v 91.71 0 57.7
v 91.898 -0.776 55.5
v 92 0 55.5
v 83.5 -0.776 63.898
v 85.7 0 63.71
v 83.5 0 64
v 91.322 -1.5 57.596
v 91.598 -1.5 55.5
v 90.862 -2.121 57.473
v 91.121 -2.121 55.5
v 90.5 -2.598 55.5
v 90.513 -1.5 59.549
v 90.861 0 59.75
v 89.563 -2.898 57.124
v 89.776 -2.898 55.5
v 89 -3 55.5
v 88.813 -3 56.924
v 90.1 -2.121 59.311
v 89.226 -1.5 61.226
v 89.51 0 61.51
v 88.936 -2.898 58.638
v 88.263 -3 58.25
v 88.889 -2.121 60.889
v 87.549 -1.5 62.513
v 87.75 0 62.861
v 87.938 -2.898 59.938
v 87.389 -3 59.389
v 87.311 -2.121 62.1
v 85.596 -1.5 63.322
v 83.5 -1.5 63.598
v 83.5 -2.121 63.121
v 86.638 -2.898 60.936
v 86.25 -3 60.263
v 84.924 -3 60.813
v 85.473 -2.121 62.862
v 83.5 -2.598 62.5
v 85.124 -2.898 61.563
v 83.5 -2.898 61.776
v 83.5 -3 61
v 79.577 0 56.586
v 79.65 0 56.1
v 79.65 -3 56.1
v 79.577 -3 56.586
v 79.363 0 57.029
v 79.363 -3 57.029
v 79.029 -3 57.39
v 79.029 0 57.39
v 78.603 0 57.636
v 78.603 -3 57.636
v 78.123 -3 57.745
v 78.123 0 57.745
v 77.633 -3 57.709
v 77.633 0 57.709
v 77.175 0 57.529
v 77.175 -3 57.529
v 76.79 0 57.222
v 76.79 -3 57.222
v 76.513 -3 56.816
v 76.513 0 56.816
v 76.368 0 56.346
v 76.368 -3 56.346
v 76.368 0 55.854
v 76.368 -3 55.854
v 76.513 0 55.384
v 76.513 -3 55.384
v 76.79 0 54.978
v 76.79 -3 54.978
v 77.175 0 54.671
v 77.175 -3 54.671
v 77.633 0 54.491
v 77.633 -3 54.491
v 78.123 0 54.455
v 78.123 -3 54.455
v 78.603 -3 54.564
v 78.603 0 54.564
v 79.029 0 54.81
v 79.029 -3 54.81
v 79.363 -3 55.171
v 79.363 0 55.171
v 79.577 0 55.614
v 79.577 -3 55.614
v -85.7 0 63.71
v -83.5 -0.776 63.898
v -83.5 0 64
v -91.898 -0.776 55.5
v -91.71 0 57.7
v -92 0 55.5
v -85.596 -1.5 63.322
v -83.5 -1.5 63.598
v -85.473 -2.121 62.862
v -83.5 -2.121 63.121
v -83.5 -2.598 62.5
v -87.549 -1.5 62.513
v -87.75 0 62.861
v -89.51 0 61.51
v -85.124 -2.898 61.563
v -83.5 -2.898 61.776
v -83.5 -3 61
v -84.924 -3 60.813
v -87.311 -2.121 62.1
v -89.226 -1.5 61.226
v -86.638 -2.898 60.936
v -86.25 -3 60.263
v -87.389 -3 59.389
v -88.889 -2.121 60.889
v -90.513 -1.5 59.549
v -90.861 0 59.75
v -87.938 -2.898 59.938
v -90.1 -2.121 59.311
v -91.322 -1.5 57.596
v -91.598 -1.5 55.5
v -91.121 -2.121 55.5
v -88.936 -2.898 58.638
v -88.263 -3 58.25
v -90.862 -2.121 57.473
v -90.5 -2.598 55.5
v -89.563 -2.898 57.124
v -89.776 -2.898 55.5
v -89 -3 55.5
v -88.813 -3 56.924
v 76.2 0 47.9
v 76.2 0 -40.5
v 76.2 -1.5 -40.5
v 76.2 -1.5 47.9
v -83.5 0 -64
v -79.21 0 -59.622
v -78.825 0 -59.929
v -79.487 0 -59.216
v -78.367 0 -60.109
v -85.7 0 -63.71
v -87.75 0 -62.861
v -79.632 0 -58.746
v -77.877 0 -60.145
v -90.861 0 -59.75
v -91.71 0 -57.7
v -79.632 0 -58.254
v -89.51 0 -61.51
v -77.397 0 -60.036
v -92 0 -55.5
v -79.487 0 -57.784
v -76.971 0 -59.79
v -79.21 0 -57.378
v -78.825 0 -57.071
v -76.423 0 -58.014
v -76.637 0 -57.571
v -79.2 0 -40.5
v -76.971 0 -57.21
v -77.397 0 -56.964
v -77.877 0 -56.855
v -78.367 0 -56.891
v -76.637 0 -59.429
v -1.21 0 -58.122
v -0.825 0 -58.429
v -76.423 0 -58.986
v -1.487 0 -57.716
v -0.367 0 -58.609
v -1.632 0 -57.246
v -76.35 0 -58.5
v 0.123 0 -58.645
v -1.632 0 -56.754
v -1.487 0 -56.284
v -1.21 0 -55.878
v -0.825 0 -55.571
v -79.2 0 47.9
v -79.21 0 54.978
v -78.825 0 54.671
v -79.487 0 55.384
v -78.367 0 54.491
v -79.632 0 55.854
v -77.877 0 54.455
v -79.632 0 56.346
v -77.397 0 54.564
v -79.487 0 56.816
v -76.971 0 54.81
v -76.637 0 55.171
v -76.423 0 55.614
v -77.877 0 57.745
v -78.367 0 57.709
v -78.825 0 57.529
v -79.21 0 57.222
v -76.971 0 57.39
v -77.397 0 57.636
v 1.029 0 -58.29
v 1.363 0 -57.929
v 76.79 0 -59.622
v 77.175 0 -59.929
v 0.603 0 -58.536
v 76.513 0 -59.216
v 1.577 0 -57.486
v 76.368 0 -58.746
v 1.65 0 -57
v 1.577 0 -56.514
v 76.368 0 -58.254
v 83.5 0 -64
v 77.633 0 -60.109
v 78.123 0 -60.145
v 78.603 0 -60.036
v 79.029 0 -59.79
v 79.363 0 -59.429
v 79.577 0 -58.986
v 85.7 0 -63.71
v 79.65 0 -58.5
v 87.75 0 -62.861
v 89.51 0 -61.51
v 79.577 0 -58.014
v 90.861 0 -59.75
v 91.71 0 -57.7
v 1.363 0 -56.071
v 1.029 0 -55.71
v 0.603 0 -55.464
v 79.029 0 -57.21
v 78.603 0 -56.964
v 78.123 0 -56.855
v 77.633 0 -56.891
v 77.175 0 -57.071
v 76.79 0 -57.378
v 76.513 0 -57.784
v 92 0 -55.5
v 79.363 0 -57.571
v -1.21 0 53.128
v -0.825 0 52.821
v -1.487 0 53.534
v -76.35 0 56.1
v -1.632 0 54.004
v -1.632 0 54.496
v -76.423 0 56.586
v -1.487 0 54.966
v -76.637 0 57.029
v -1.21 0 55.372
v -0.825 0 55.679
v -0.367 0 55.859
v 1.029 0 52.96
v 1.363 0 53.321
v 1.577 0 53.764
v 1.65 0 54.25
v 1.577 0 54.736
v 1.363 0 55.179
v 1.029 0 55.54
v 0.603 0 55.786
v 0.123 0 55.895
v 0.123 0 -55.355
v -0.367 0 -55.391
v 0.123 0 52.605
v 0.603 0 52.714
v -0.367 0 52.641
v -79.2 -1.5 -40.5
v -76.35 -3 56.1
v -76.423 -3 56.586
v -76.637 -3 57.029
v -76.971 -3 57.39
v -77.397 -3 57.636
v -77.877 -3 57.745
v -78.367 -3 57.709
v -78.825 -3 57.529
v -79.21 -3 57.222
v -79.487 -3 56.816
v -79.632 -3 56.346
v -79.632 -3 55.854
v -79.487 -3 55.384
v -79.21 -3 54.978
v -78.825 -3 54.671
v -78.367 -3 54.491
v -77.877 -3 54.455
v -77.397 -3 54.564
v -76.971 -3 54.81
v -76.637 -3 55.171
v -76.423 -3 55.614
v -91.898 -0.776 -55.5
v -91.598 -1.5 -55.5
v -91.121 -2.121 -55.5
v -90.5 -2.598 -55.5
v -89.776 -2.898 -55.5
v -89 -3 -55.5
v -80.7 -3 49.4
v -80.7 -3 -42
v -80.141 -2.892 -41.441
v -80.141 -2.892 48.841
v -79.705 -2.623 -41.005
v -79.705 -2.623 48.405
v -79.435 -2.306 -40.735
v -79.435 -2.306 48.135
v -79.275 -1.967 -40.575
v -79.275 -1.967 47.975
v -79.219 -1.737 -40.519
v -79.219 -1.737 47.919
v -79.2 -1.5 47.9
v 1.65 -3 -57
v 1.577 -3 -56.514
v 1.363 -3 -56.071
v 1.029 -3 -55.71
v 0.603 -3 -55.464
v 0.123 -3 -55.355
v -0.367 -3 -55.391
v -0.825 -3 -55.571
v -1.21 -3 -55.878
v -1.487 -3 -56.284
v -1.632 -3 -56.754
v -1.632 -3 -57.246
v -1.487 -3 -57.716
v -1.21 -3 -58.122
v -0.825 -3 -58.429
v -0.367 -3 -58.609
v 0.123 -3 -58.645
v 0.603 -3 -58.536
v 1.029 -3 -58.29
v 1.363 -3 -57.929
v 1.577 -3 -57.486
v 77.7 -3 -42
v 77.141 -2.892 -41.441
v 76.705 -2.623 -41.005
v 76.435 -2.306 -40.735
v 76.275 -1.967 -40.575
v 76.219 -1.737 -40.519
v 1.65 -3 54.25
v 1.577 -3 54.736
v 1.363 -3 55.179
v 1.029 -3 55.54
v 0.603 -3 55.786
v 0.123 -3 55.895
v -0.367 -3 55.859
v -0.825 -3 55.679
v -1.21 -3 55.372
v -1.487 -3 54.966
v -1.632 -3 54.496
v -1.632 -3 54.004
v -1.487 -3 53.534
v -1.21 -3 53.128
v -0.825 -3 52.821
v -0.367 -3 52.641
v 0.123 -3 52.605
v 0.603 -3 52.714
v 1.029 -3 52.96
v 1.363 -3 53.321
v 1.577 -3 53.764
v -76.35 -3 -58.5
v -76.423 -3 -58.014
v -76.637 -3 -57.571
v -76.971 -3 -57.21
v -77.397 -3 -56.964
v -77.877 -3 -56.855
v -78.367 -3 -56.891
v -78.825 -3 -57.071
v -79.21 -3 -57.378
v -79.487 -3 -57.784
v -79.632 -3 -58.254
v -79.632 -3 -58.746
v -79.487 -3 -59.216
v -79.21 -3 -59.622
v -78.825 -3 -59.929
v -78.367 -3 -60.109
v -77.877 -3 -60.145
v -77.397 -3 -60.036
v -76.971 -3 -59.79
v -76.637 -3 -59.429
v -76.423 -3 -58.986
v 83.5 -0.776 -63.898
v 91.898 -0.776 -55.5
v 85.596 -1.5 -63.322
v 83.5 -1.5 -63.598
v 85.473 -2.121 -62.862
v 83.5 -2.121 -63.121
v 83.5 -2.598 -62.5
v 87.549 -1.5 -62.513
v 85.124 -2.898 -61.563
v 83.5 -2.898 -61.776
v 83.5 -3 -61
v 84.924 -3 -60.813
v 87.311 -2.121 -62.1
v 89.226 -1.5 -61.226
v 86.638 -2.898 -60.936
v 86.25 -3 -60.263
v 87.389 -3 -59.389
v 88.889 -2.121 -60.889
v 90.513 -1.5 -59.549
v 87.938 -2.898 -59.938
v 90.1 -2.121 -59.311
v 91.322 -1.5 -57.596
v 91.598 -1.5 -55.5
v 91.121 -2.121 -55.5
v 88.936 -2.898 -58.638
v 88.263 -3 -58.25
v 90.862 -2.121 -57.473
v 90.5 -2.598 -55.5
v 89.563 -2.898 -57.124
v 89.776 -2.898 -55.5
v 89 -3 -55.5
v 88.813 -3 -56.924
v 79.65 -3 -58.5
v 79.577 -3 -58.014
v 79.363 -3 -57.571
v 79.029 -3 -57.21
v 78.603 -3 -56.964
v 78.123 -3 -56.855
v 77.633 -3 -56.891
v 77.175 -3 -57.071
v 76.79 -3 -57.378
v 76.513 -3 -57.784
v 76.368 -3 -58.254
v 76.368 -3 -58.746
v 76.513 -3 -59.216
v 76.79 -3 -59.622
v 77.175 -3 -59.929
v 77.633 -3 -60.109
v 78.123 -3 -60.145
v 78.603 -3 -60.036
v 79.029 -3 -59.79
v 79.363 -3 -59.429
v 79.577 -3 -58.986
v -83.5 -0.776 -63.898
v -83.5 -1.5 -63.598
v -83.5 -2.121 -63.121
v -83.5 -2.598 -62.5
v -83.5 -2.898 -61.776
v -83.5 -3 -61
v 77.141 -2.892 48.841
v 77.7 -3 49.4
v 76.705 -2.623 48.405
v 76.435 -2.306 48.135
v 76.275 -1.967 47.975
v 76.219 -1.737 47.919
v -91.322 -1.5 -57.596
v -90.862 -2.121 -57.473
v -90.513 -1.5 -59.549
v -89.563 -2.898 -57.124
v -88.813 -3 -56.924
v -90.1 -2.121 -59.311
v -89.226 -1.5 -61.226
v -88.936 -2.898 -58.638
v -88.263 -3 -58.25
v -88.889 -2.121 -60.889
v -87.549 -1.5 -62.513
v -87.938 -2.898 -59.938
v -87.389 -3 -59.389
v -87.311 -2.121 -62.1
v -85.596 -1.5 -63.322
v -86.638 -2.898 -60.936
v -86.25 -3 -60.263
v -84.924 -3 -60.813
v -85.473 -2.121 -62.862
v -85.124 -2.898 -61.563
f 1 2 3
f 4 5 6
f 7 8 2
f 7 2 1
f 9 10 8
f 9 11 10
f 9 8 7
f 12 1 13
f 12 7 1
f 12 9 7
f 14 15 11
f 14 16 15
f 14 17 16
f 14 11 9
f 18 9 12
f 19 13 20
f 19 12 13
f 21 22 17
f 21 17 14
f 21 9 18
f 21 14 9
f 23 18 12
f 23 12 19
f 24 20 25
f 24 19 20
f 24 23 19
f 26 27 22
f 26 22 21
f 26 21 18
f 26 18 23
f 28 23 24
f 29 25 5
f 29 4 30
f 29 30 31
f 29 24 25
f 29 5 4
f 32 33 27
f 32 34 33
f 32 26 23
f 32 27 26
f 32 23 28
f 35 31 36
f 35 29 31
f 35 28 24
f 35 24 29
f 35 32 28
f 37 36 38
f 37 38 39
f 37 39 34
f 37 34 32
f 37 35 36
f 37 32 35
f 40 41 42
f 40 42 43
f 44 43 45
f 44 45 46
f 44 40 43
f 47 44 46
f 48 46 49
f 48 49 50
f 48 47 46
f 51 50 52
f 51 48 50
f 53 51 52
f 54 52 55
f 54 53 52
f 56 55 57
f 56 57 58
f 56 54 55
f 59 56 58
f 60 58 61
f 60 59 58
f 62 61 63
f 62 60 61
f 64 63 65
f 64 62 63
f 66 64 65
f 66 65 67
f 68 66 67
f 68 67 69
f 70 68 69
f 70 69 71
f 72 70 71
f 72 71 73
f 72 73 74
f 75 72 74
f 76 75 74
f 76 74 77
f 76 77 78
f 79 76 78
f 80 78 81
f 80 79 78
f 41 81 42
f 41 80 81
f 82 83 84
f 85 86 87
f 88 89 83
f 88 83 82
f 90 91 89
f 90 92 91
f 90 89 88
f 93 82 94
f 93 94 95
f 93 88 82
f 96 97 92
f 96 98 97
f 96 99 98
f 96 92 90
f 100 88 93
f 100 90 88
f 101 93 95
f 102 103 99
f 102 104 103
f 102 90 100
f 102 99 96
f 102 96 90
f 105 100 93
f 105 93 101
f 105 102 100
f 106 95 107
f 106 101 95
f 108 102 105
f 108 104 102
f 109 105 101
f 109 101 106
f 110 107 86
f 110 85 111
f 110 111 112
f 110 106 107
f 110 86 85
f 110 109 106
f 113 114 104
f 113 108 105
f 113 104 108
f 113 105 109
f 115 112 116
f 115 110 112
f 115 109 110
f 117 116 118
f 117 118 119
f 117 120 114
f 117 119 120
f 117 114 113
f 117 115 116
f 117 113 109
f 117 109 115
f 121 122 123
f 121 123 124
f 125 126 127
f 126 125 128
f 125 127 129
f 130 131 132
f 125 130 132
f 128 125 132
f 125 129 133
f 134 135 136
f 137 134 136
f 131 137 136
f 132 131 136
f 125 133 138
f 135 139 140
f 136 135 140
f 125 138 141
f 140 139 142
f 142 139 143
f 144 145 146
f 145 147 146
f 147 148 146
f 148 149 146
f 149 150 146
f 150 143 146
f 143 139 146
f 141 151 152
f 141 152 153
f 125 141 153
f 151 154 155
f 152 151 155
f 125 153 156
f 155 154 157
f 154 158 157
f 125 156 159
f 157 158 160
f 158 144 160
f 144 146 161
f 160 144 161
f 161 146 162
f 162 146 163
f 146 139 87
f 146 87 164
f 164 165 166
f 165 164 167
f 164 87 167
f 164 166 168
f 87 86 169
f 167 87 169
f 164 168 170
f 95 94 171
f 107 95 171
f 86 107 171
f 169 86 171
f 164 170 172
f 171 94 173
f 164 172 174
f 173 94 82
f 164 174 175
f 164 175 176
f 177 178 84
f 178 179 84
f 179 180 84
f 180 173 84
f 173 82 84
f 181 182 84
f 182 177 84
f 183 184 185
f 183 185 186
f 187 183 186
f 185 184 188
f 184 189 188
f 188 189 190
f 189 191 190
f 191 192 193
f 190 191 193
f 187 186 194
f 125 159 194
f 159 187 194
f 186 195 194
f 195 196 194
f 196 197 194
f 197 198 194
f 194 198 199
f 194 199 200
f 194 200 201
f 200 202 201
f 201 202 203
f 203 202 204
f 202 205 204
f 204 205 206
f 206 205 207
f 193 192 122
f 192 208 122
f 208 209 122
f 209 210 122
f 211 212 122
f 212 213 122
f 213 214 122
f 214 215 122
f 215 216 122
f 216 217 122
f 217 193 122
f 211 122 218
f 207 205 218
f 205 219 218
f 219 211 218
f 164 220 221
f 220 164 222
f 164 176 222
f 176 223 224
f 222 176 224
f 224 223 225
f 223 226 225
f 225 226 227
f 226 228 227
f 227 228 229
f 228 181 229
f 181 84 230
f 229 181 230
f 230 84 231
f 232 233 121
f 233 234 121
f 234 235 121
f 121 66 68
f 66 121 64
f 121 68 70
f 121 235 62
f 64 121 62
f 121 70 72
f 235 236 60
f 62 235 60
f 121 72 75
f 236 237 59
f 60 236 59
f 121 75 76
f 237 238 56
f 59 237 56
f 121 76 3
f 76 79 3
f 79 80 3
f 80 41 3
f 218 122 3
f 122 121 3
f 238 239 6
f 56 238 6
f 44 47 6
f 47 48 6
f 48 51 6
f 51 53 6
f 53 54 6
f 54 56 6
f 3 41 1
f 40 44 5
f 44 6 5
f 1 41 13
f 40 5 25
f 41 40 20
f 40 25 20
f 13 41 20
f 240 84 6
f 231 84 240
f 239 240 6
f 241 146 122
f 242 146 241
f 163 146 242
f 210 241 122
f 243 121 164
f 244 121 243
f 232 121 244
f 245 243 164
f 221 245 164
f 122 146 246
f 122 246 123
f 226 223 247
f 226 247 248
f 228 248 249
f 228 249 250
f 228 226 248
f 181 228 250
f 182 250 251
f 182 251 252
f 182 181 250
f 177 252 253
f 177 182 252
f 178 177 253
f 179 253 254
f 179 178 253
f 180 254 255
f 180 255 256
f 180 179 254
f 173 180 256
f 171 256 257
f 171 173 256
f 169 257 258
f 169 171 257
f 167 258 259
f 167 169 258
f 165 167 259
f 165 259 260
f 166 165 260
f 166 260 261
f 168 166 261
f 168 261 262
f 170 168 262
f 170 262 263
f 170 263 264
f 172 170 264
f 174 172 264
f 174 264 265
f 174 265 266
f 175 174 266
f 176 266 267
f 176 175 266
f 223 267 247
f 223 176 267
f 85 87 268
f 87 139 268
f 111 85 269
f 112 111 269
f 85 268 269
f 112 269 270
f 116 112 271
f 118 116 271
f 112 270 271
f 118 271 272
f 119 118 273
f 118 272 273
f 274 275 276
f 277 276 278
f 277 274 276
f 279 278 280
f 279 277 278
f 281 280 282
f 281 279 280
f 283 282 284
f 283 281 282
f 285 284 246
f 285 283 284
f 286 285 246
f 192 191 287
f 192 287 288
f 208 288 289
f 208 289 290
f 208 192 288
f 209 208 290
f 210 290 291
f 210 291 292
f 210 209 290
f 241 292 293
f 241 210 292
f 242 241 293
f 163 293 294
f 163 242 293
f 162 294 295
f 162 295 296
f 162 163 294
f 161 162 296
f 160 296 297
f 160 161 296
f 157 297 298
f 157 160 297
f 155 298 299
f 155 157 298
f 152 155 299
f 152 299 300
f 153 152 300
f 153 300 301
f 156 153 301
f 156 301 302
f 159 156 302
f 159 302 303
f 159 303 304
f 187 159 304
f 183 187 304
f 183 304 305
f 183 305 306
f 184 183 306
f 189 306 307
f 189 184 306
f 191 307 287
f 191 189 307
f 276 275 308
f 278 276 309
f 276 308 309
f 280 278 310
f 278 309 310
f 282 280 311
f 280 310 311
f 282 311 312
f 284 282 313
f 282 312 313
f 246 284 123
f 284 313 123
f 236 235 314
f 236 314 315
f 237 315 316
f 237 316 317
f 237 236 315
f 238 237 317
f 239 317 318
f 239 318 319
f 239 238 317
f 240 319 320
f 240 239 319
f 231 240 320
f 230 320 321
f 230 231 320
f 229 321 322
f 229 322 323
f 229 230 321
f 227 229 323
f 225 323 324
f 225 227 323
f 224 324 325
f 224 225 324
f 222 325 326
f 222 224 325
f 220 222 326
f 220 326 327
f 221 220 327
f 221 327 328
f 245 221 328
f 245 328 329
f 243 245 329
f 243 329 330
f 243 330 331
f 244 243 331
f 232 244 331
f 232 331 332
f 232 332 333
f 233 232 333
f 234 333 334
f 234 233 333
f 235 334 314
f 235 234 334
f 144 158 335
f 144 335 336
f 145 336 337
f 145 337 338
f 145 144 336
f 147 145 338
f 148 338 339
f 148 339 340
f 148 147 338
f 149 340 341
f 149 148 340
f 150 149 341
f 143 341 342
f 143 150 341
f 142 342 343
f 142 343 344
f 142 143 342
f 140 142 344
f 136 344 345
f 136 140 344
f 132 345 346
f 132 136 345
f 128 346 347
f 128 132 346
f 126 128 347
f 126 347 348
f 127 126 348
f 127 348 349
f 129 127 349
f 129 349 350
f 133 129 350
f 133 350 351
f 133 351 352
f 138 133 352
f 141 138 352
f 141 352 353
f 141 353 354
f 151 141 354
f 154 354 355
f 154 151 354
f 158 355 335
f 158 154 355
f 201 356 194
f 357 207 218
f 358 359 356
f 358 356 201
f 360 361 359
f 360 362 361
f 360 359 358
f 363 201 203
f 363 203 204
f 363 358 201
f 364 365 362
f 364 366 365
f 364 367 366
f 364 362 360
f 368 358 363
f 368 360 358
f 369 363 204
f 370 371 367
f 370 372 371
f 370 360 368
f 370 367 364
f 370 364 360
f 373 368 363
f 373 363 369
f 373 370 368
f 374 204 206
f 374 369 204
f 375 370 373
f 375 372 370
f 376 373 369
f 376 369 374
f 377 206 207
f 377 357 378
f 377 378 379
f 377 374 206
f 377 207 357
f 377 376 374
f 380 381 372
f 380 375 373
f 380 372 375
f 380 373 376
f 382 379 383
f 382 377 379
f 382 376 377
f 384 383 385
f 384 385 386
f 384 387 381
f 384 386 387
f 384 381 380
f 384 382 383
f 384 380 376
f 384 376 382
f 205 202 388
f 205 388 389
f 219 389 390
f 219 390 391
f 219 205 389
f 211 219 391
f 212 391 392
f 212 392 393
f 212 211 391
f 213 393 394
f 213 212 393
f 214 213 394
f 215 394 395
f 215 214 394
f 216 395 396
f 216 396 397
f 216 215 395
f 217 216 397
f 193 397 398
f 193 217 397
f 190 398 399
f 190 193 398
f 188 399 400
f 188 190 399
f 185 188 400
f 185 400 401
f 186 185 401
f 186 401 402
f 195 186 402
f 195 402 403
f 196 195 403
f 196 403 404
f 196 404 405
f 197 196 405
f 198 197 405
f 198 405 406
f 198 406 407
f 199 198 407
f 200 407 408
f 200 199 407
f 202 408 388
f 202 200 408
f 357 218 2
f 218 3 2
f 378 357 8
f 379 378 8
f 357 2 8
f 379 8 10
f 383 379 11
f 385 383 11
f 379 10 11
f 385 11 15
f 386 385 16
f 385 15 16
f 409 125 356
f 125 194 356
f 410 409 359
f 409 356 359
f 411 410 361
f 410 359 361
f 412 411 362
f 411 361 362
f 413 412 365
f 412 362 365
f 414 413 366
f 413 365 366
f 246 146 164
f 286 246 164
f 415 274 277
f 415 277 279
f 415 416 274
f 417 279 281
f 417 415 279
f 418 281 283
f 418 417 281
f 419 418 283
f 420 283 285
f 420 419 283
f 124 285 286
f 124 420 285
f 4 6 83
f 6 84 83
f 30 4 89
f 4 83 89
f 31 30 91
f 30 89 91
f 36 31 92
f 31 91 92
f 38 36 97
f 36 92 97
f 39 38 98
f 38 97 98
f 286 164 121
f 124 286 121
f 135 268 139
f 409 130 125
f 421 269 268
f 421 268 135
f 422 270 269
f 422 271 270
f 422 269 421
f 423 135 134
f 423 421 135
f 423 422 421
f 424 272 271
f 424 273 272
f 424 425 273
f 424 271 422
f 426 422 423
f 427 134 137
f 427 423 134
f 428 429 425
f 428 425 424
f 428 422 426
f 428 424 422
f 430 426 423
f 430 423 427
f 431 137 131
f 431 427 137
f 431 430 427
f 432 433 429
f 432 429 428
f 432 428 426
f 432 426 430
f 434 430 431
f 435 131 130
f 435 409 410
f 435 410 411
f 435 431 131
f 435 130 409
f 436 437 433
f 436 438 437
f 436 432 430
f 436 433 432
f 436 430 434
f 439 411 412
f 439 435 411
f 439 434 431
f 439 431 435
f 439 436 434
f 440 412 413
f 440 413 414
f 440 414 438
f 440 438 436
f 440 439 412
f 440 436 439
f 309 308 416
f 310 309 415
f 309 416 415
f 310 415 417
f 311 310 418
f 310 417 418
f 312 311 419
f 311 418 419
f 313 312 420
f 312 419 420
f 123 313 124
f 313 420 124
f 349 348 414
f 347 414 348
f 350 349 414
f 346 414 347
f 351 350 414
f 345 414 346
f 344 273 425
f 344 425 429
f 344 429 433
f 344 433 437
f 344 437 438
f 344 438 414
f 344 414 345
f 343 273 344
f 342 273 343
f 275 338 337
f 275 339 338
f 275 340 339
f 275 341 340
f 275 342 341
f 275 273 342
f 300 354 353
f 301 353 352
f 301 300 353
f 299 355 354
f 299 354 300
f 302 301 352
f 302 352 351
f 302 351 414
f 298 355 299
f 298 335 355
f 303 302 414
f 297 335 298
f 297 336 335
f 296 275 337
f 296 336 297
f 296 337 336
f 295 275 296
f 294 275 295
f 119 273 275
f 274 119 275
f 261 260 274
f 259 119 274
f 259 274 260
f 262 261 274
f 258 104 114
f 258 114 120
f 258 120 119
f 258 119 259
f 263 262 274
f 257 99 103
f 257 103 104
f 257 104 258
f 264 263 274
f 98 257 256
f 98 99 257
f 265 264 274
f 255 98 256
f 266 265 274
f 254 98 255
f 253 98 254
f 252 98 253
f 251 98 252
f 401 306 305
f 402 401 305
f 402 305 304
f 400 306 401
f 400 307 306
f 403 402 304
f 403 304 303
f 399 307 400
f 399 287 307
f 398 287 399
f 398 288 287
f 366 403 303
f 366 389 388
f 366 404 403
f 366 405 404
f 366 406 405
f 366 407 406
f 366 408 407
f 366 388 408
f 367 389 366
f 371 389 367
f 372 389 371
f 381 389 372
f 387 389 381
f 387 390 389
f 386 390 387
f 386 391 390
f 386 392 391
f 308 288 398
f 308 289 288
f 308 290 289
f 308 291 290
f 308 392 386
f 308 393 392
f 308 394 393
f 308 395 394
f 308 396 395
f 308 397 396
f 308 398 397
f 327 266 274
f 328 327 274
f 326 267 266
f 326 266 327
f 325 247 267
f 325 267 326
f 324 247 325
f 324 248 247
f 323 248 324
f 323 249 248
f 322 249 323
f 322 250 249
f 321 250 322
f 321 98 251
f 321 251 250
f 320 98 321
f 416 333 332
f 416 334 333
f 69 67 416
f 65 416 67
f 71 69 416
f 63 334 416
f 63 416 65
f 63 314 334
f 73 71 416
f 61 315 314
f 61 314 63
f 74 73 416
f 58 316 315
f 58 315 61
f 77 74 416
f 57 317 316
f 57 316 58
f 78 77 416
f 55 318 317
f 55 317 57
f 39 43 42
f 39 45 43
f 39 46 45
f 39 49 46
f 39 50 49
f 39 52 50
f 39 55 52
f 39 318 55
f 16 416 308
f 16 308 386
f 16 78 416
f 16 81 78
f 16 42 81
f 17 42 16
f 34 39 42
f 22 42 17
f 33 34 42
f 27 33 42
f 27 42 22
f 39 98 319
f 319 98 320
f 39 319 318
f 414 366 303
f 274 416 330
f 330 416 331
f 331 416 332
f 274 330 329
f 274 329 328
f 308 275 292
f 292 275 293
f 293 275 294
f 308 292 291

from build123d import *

# Parameters (mm, degrees)
F0_R     = 1.65
F0_W     = 155.4
F0_H     = 88.4
F1_DEPTH = 3
F2_R     = 2.99999
F3_R     = 1.5


# Not quite as in the source:
# - a fillet or chamfer is up to 0.001 mm smaller than in the source, because OpenCascade refuses the exact size


with BuildPart() as f1:
    # F0 (on Front) → F1 (new body)
    with BuildSketch(Plane.XZ):
        with BuildLine():
            Line((83.5, 64), (-83.5, 64))
            ThreePointArc((-83.5, 64), (-89.5104076401, 61.5104076401), (-92, 55.5))
            Line((-92, 55.5), (-92, -55.5))
            ThreePointArc((-92, -55.5), (-89.5104076401, -61.5104076401), (-83.5, -64))
            Line((-83.5, -64), (83.5, -64))
            ThreePointArc((83.5, -64), (89.5104076401, -61.5104076401), (92, -55.5))
            Line((92, -55.5), (92, 55.5))
            ThreePointArc((92, 55.5), (89.5104076401, 61.5104076401), (83.5, 64))
        make_face()
        with Locations((-78, -58.5)):
            Circle(F0_R, mode=Mode.SUBTRACT)
        with Locations((0, -57)):
            Circle(F0_R, mode=Mode.SUBTRACT)
        with Locations((78, -58.5)):
            Circle(F0_R, mode=Mode.SUBTRACT)
        with BuildLine():
            Line((-83.5, -50.5), (-83.5, 52.5))
            Line((-83.5, 52.5), (83.5, 52.5))
            Line((83.5, 52.5), (83.5, -51.5))
            ThreePointArc((83.5, -51.5), (83.2071067812, -52.2071067812), (82.5, -52.5))
            Line((82.5, -52.5), (47.5, -52.5))
            ThreePointArc((47.5, -52.5), (46.7928932188, -52.2071067812), (46.5, -51.5))
            ThreePointArc((46.5, -51.5), (46.2071067812, -50.7928932188), (45.5, -50.5))
            Line((45.5, -50.5), (-83.5, -50.5))
        make_face(mode=Mode.SUBTRACT)
        with Locations((-78, 56.1)):
            Circle(F0_R, mode=Mode.SUBTRACT)
        with Locations((0, 54.25)):
            Circle(F0_R, mode=Mode.SUBTRACT)
        with Locations((78, 56.1)):
            Circle(F0_R, mode=Mode.SUBTRACT)
        with BuildLine():
            Line((83.5, 52.5), (-83.5, 52.5))
            Line((-83.5, 52.5), (-83.5, -50.5))
            Line((-83.5, -50.5), (45.5, -50.5))
            ThreePointArc((45.5, -50.5), (46.2071067812, -50.7928932188), (46.5, -51.5))
            ThreePointArc((46.5, -51.5), (46.7928932188, -52.2071067812), (47.5, -52.5))
            Line((47.5, -52.5), (82.5, -52.5))
            ThreePointArc((82.5, -52.5), (83.2071067812, -52.2071067812), (83.5, -51.5))
            Line((83.5, -51.5), (83.5, 52.5))
        make_face()
        with Locations((-1.5, 3.7)):
            Rectangle(F0_W, F0_H, mode=Mode.SUBTRACT)
    extrude(amount=F1_DEPTH)

    # F2 (radius 3 in the source; OpenCascade refuses exactly that, so slightly less here)
    f2_edges = [f1.edges().sort_by_distance(p)[0] for p in [
        (92, -3, 0),
    ]]
    fillet(f2_edges, radius=F2_R)

    # F3
    f3_edges = [f1.edges().sort_by_distance(p)[0] for p in [
        (-79.2, -3, 3.7),
        (-1.5, -3, 47.9),
        (76.2, -3, 3.7),
        (-1.5, -3, -40.5),
    ]]
    fillet(f3_edges, radius=F3_R)


solid = f1.part
